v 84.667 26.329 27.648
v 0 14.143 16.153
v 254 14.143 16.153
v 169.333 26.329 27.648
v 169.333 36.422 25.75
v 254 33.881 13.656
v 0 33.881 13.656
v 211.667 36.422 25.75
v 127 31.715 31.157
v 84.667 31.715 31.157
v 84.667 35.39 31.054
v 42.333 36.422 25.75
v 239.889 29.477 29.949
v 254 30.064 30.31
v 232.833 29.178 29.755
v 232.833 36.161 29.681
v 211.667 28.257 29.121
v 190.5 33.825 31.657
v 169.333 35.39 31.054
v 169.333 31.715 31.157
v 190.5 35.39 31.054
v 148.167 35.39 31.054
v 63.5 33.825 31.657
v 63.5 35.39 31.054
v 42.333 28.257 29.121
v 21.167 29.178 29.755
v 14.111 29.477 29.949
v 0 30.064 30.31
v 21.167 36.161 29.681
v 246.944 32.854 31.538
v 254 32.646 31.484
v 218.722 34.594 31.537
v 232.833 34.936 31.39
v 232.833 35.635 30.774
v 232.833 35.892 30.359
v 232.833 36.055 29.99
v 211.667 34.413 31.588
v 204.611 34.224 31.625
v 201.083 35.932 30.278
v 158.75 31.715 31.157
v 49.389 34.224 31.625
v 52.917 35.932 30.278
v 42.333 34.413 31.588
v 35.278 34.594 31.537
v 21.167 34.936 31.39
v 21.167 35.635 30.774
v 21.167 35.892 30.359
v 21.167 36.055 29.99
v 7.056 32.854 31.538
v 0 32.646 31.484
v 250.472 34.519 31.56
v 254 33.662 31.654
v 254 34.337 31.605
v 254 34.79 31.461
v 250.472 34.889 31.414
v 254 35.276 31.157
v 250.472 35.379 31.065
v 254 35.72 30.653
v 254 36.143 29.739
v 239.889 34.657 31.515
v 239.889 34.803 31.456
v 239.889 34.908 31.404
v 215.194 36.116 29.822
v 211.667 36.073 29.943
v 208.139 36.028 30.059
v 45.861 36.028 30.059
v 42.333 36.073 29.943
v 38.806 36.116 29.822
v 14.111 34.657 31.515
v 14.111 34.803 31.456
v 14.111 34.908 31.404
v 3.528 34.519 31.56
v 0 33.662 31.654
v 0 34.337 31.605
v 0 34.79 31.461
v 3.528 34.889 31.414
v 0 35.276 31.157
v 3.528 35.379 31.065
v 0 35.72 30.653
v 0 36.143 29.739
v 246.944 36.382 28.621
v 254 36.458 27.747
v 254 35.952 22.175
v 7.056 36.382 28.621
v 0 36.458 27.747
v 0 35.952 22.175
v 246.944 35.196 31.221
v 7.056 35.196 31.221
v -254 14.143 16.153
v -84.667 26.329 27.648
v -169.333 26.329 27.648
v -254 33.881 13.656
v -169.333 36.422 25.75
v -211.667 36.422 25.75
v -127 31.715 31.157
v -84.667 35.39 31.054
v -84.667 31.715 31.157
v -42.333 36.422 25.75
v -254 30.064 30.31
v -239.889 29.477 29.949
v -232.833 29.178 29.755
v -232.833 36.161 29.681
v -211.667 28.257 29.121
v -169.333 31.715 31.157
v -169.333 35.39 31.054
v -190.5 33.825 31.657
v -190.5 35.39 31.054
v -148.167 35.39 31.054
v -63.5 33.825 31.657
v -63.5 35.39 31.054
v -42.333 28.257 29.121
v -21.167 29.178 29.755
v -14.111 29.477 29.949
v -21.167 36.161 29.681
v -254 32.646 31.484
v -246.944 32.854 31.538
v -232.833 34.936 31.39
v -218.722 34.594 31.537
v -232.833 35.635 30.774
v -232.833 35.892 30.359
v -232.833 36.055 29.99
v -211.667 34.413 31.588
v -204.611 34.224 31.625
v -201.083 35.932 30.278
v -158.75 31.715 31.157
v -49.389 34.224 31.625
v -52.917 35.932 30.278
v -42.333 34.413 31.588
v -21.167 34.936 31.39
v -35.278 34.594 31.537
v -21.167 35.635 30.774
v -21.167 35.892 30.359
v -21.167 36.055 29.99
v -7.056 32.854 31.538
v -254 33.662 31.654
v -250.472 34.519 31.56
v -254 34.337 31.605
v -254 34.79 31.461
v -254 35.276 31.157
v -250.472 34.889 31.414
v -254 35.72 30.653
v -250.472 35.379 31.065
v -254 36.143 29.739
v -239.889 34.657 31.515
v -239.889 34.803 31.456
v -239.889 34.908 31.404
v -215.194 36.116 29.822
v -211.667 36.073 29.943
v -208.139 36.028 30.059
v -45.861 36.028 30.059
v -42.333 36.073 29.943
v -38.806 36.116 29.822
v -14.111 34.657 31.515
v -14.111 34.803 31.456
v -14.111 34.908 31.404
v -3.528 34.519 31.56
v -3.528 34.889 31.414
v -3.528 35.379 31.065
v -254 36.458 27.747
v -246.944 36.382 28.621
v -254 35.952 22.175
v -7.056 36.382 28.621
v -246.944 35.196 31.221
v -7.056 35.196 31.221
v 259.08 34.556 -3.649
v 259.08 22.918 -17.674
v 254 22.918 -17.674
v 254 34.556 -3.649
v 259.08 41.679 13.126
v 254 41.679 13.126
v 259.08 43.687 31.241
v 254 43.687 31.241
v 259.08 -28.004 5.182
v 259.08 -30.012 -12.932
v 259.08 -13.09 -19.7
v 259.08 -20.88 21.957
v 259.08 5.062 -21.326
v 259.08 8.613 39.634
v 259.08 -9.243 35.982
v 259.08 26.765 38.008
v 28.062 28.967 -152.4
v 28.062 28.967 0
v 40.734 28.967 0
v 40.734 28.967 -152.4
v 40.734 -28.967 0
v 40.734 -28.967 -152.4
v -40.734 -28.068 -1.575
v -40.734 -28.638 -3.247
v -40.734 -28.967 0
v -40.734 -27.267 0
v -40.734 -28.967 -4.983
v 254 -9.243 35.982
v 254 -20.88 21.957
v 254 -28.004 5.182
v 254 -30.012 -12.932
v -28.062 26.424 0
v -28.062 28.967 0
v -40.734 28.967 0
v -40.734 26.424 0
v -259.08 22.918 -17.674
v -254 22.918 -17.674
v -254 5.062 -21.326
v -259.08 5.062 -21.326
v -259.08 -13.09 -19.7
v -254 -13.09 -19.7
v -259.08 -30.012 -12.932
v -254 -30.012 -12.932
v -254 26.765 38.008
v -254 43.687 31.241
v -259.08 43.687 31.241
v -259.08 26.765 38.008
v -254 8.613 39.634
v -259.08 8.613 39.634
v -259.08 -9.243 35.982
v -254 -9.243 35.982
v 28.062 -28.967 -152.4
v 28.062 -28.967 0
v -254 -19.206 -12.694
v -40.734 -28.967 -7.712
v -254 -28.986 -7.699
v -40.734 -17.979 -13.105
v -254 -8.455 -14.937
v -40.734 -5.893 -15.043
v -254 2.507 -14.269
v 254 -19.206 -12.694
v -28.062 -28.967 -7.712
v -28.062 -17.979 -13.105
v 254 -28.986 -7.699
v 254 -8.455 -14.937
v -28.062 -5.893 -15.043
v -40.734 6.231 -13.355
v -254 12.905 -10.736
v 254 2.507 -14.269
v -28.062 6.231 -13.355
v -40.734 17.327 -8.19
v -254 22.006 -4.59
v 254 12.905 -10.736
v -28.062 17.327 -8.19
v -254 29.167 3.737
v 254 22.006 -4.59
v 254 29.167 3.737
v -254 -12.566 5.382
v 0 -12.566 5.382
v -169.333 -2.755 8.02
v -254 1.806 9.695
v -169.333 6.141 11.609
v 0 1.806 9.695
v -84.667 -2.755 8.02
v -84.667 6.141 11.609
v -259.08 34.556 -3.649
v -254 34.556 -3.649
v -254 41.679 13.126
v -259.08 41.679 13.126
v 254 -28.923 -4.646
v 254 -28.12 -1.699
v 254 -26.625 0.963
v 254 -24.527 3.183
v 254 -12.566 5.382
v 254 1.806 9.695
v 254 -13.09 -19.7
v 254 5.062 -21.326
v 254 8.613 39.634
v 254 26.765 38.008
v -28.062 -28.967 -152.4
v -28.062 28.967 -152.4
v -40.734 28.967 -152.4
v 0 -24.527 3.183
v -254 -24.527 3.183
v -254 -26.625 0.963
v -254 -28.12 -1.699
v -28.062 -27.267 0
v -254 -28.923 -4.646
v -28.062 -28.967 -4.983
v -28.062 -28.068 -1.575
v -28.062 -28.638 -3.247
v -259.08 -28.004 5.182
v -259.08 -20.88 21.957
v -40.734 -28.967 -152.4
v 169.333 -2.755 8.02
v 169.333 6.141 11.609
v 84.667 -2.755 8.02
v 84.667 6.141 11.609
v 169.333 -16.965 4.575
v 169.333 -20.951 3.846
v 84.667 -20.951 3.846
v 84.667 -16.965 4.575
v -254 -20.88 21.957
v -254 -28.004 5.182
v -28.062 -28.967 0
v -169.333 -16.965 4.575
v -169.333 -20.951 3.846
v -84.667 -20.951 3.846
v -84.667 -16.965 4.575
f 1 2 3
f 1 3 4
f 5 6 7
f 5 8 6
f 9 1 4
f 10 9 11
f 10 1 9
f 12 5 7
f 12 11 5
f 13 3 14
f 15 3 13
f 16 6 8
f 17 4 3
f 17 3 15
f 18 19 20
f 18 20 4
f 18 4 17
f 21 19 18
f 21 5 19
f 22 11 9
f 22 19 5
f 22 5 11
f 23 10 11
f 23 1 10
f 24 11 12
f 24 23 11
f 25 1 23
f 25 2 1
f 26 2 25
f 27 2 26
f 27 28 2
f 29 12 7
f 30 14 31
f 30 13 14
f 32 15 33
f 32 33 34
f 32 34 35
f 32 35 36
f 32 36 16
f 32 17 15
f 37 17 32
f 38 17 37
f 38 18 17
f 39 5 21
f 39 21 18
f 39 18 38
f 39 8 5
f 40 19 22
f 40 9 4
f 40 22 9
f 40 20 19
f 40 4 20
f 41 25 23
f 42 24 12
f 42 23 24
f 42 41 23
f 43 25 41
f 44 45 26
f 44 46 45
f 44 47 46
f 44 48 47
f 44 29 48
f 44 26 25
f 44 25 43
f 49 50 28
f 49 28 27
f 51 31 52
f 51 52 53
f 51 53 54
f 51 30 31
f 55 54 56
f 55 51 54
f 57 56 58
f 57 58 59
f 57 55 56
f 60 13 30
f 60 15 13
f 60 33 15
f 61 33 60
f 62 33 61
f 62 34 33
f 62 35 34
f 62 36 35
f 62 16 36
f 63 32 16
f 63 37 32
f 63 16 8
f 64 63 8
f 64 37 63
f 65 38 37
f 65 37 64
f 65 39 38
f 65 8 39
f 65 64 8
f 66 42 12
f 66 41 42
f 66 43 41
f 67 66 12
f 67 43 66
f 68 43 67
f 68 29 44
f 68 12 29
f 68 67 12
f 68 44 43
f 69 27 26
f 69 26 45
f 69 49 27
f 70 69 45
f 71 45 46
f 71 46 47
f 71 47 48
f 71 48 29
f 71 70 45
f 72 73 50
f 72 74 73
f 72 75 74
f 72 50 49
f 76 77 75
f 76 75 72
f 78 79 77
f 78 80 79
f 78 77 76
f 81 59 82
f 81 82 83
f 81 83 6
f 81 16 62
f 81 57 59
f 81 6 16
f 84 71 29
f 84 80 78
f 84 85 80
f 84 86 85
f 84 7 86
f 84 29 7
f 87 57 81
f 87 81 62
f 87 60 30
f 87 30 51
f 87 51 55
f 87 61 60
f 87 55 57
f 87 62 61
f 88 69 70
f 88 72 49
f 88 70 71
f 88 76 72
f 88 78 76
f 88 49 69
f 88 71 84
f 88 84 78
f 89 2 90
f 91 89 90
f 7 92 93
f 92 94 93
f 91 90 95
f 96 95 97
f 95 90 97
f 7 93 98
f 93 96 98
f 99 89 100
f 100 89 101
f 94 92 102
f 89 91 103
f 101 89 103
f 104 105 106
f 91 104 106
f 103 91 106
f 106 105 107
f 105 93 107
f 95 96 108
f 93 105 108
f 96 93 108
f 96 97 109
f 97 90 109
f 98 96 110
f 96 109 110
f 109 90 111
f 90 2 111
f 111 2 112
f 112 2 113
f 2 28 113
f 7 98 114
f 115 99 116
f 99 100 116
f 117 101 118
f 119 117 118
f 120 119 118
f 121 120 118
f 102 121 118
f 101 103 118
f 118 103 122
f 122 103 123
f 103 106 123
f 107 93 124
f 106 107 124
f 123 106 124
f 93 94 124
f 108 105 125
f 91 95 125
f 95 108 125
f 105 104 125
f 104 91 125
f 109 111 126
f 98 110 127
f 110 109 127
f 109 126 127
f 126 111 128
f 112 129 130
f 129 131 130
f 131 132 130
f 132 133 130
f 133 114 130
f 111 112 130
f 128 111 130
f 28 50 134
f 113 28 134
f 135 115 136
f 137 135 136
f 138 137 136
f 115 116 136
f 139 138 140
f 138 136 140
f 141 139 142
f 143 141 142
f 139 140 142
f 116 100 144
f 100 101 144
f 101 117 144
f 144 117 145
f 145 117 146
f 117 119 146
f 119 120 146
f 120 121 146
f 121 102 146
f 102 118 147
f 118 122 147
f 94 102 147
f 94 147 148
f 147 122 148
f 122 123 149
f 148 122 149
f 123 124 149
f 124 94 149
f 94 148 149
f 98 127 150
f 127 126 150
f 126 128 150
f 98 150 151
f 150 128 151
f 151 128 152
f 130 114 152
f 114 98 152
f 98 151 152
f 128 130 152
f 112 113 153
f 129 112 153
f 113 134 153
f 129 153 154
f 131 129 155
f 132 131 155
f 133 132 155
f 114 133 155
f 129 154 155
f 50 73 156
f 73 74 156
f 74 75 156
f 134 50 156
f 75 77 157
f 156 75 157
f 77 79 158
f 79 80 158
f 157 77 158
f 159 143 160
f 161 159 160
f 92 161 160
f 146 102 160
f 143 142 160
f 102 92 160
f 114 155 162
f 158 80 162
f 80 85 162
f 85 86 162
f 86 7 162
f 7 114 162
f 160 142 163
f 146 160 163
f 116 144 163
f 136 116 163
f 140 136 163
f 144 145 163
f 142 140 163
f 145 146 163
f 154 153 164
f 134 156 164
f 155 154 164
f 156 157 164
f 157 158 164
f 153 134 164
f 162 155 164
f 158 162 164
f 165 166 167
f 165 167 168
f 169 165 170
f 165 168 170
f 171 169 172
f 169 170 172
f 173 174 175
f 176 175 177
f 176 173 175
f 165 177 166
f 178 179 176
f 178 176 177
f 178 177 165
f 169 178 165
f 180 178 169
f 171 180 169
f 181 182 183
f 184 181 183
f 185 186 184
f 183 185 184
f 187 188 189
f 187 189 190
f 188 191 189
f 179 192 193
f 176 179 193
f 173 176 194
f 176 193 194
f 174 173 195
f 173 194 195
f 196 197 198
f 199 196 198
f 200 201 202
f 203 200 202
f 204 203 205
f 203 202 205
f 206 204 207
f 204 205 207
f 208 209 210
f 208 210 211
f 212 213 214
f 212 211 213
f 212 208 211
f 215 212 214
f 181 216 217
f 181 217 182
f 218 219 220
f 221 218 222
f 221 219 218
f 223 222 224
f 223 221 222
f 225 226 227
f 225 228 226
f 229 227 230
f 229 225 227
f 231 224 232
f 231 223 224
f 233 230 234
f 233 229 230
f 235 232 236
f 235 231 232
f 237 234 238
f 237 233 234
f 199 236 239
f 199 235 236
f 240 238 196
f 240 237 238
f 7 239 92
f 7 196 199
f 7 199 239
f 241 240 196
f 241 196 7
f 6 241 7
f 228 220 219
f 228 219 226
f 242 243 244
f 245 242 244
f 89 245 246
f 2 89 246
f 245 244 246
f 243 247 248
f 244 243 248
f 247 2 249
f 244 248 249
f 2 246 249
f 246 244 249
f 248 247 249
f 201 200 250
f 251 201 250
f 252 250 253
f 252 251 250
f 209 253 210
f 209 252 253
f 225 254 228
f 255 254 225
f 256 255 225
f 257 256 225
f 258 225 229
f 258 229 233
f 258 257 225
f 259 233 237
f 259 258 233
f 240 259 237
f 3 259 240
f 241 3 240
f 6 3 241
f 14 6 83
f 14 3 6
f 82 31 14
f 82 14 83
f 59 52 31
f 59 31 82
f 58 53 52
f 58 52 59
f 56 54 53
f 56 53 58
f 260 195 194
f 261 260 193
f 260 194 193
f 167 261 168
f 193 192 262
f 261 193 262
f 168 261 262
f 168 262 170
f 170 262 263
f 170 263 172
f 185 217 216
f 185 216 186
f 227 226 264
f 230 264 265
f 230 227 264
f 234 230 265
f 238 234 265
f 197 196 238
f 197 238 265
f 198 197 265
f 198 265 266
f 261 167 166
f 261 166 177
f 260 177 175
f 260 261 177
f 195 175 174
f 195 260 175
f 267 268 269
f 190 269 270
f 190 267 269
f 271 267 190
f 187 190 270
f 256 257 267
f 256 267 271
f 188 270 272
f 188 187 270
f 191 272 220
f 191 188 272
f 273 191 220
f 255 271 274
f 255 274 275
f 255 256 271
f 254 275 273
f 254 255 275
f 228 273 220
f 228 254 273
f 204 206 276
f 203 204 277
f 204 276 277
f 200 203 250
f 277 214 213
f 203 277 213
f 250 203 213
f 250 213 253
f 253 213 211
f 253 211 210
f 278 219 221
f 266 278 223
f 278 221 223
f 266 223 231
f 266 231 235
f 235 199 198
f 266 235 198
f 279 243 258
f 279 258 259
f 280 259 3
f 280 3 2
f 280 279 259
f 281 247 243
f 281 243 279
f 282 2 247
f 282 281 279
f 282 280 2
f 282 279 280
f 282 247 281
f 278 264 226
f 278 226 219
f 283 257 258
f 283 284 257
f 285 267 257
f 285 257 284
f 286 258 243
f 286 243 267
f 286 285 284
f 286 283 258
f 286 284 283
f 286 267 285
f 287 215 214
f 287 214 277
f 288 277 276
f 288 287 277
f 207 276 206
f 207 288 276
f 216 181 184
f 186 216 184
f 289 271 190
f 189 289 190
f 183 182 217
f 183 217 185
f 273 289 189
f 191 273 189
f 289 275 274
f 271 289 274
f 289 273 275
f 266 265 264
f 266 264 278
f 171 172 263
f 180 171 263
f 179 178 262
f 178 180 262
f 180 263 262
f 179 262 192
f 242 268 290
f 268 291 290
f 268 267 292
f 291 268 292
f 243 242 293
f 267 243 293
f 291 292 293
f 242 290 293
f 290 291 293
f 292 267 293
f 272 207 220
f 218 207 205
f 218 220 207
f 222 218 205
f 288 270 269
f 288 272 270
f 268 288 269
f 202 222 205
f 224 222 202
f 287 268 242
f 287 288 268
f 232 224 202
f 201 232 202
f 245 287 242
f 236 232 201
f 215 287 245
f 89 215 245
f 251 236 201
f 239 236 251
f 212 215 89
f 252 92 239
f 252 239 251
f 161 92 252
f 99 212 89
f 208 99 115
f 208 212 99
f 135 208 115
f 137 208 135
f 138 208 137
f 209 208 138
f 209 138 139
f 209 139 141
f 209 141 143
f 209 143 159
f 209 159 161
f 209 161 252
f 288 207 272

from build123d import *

# Parameters (mm, degrees)
F1_DEPTH    = 254
F3_DEPTH    = 5.08
F4_W        = 12.6729309559
F4_H        = 57.9334199429
F5_DEPTH    = 152.4
F6_T1_DEPTH = 319.230203427


# Not quite as in the source:
# - a fillet or chamfer that OpenCascade refuses, or shapes differently, is made with other operations: its cross-section is extruded or revolved along the edge and cut away or added


with BuildPart() as f1:
    # F0 (on Right) → F1 (new body)
    with BuildSketch(Plane.YZ):
        with BuildLine():
            ThreePointArc((-24.5272097082, 3.183184572), (-28.1195399904, -1.6994877312), (-28.9857762817, -7.6990677469))
            ThreePointArc((-28.9857762817, -7.6990677469), (7.8240128757, -12.8494213203), (33.8808850254, 13.655788234))
            add(Edge.make_bspline(
                [(14.1425715482, 16.1532932262), (25.4105223066, 27.4543127656), (43.1557495947, 45.6951015007), (33.8808850254, 13.655788234)],
                knots=[0, 0, 0, 0, 19.8956917475, 19.8956917475, 19.8956917475, 19.8956917475], degree=3))
            add(Edge.make_bspline(
                [(-12.5656056095, 5.3816662895), (-2.2918152978, 7.5478072589), (6.5829970209, 11.1284464372), (14.1425715482, 16.1532932262)],
                knots=[0, 0, 0, 0, 28.7985186069, 28.7985186069, 28.7985186069, 28.7985186069], degree=3))
            add(Edge.make_bspline(
                [(-24.5272097082, 3.183184572), (-21.1546527218, 3.8161453558), (-17.1728906965, 4.5318009653), (-12.5656056095, 5.3816662895)],
                knots=[17.6782467535, 17.6782467535, 17.6782467535, 17.6782467535, 20.9935134705, 20.9935134705, 20.9935134705, 20.9935134705], degree=3))
        make_face()
    extrude(amount=F1_DEPTH)

    # F7: F1, F3, F5 across face


with BuildPart() as f3:
    # F2 (on face) → F3 (new body)
    with BuildSketch(Plane.YZ.offset(254)):
        Polygon((33.7327011203, 63.0955714471), (-53.4129644445, 10.863464719), (-20.0576754131, -44.7875331985), (67.0879901518, 7.4445735296), align=None)
    extrude(amount=F3_DEPTH)

    # F6: fillet of radius 62.8300406854 on 4 edges, made by hand

    # F6_s2 → F6_t1 (cut)
    with BuildSketch(Plane.YZ.offset(96.9248982865)):
        with BuildLine():
            ThreePointArc((33.8337193999, -12.4868895882), (-13.7338907968, -19.5424696286), (-52.3583190234, 9.1038616144))
            Line((-52.3583190234, 9.1038616144), (-20.0576754131, -44.7875331985))
            Line((-20.0576754131, -44.7875331985), (33.8337193999, -12.4868895882))
        make_face()
        with BuildLine():
            ThreePointArc((0.4784303684, 43.1641083293), (-28.1679008746, 4.5396801026), (-21.1123208342, -43.027930094))
            Line((-21.1123208342, -43.027930094), (-53.4129644445, 10.863464719))
            Line((-53.4129644445, 10.863464719), (0.4784303684, 43.1641083293))
        make_face()
        with BuildLine():
            ThreePointArc((66.0333447307, 9.2041766341), (27.408916504, 37.8505078772), (-20.1586936926, 30.7949278367))
            Line((-20.1586936926, 30.7949278367), (33.7327011203, 63.0955714471))
            Line((33.7327011203, 63.0955714471), (66.0333447307, 9.2041766341))
        make_face()
        with BuildLine():
            ThreePointArc((13.1965953388, -24.8560700808), (41.8429265819, 13.7683581459), (34.7873465414, 61.3359683426))
            Line((34.7873465414, 61.3359683426), (67.0879901518, 7.4445735296))
            Line((67.0879901518, 7.4445735296), (13.1965953388, -24.8560700808))
        make_face()
    extrude(amount=F6_T1_DEPTH, mode=Mode.SUBTRACT)


with BuildPart() as f5:
    # F4 (on Top) → F5 (new body)
    with BuildSketch(Plane.XY):
        with Locations((34.3979746103, 0)):
            Rectangle(F4_W, F4_H)
    extrude(amount=-F5_DEPTH)


with BuildPart() as f1_1:
    add(f1.part)
    add(f1.part.mirror(Plane(origin=(0, 6.6636224676, 3.2061249458), x_dir=(0, 1, 0), z_dir=(-1, 0, 0))))
    add(f3.part.mirror(Plane(origin=(0, 6.6636224676, 3.2061249458), x_dir=(0, 1, 0), z_dir=(-1, 0, 0))))
    add(f5.part.mirror(Plane(origin=(0, 6.6636224676, 3.2061249458), x_dir=(0, 1, 0), z_dir=(-1, 0, 0))))


solid = Compound([f3.part, f5.part, f1_1.part])
